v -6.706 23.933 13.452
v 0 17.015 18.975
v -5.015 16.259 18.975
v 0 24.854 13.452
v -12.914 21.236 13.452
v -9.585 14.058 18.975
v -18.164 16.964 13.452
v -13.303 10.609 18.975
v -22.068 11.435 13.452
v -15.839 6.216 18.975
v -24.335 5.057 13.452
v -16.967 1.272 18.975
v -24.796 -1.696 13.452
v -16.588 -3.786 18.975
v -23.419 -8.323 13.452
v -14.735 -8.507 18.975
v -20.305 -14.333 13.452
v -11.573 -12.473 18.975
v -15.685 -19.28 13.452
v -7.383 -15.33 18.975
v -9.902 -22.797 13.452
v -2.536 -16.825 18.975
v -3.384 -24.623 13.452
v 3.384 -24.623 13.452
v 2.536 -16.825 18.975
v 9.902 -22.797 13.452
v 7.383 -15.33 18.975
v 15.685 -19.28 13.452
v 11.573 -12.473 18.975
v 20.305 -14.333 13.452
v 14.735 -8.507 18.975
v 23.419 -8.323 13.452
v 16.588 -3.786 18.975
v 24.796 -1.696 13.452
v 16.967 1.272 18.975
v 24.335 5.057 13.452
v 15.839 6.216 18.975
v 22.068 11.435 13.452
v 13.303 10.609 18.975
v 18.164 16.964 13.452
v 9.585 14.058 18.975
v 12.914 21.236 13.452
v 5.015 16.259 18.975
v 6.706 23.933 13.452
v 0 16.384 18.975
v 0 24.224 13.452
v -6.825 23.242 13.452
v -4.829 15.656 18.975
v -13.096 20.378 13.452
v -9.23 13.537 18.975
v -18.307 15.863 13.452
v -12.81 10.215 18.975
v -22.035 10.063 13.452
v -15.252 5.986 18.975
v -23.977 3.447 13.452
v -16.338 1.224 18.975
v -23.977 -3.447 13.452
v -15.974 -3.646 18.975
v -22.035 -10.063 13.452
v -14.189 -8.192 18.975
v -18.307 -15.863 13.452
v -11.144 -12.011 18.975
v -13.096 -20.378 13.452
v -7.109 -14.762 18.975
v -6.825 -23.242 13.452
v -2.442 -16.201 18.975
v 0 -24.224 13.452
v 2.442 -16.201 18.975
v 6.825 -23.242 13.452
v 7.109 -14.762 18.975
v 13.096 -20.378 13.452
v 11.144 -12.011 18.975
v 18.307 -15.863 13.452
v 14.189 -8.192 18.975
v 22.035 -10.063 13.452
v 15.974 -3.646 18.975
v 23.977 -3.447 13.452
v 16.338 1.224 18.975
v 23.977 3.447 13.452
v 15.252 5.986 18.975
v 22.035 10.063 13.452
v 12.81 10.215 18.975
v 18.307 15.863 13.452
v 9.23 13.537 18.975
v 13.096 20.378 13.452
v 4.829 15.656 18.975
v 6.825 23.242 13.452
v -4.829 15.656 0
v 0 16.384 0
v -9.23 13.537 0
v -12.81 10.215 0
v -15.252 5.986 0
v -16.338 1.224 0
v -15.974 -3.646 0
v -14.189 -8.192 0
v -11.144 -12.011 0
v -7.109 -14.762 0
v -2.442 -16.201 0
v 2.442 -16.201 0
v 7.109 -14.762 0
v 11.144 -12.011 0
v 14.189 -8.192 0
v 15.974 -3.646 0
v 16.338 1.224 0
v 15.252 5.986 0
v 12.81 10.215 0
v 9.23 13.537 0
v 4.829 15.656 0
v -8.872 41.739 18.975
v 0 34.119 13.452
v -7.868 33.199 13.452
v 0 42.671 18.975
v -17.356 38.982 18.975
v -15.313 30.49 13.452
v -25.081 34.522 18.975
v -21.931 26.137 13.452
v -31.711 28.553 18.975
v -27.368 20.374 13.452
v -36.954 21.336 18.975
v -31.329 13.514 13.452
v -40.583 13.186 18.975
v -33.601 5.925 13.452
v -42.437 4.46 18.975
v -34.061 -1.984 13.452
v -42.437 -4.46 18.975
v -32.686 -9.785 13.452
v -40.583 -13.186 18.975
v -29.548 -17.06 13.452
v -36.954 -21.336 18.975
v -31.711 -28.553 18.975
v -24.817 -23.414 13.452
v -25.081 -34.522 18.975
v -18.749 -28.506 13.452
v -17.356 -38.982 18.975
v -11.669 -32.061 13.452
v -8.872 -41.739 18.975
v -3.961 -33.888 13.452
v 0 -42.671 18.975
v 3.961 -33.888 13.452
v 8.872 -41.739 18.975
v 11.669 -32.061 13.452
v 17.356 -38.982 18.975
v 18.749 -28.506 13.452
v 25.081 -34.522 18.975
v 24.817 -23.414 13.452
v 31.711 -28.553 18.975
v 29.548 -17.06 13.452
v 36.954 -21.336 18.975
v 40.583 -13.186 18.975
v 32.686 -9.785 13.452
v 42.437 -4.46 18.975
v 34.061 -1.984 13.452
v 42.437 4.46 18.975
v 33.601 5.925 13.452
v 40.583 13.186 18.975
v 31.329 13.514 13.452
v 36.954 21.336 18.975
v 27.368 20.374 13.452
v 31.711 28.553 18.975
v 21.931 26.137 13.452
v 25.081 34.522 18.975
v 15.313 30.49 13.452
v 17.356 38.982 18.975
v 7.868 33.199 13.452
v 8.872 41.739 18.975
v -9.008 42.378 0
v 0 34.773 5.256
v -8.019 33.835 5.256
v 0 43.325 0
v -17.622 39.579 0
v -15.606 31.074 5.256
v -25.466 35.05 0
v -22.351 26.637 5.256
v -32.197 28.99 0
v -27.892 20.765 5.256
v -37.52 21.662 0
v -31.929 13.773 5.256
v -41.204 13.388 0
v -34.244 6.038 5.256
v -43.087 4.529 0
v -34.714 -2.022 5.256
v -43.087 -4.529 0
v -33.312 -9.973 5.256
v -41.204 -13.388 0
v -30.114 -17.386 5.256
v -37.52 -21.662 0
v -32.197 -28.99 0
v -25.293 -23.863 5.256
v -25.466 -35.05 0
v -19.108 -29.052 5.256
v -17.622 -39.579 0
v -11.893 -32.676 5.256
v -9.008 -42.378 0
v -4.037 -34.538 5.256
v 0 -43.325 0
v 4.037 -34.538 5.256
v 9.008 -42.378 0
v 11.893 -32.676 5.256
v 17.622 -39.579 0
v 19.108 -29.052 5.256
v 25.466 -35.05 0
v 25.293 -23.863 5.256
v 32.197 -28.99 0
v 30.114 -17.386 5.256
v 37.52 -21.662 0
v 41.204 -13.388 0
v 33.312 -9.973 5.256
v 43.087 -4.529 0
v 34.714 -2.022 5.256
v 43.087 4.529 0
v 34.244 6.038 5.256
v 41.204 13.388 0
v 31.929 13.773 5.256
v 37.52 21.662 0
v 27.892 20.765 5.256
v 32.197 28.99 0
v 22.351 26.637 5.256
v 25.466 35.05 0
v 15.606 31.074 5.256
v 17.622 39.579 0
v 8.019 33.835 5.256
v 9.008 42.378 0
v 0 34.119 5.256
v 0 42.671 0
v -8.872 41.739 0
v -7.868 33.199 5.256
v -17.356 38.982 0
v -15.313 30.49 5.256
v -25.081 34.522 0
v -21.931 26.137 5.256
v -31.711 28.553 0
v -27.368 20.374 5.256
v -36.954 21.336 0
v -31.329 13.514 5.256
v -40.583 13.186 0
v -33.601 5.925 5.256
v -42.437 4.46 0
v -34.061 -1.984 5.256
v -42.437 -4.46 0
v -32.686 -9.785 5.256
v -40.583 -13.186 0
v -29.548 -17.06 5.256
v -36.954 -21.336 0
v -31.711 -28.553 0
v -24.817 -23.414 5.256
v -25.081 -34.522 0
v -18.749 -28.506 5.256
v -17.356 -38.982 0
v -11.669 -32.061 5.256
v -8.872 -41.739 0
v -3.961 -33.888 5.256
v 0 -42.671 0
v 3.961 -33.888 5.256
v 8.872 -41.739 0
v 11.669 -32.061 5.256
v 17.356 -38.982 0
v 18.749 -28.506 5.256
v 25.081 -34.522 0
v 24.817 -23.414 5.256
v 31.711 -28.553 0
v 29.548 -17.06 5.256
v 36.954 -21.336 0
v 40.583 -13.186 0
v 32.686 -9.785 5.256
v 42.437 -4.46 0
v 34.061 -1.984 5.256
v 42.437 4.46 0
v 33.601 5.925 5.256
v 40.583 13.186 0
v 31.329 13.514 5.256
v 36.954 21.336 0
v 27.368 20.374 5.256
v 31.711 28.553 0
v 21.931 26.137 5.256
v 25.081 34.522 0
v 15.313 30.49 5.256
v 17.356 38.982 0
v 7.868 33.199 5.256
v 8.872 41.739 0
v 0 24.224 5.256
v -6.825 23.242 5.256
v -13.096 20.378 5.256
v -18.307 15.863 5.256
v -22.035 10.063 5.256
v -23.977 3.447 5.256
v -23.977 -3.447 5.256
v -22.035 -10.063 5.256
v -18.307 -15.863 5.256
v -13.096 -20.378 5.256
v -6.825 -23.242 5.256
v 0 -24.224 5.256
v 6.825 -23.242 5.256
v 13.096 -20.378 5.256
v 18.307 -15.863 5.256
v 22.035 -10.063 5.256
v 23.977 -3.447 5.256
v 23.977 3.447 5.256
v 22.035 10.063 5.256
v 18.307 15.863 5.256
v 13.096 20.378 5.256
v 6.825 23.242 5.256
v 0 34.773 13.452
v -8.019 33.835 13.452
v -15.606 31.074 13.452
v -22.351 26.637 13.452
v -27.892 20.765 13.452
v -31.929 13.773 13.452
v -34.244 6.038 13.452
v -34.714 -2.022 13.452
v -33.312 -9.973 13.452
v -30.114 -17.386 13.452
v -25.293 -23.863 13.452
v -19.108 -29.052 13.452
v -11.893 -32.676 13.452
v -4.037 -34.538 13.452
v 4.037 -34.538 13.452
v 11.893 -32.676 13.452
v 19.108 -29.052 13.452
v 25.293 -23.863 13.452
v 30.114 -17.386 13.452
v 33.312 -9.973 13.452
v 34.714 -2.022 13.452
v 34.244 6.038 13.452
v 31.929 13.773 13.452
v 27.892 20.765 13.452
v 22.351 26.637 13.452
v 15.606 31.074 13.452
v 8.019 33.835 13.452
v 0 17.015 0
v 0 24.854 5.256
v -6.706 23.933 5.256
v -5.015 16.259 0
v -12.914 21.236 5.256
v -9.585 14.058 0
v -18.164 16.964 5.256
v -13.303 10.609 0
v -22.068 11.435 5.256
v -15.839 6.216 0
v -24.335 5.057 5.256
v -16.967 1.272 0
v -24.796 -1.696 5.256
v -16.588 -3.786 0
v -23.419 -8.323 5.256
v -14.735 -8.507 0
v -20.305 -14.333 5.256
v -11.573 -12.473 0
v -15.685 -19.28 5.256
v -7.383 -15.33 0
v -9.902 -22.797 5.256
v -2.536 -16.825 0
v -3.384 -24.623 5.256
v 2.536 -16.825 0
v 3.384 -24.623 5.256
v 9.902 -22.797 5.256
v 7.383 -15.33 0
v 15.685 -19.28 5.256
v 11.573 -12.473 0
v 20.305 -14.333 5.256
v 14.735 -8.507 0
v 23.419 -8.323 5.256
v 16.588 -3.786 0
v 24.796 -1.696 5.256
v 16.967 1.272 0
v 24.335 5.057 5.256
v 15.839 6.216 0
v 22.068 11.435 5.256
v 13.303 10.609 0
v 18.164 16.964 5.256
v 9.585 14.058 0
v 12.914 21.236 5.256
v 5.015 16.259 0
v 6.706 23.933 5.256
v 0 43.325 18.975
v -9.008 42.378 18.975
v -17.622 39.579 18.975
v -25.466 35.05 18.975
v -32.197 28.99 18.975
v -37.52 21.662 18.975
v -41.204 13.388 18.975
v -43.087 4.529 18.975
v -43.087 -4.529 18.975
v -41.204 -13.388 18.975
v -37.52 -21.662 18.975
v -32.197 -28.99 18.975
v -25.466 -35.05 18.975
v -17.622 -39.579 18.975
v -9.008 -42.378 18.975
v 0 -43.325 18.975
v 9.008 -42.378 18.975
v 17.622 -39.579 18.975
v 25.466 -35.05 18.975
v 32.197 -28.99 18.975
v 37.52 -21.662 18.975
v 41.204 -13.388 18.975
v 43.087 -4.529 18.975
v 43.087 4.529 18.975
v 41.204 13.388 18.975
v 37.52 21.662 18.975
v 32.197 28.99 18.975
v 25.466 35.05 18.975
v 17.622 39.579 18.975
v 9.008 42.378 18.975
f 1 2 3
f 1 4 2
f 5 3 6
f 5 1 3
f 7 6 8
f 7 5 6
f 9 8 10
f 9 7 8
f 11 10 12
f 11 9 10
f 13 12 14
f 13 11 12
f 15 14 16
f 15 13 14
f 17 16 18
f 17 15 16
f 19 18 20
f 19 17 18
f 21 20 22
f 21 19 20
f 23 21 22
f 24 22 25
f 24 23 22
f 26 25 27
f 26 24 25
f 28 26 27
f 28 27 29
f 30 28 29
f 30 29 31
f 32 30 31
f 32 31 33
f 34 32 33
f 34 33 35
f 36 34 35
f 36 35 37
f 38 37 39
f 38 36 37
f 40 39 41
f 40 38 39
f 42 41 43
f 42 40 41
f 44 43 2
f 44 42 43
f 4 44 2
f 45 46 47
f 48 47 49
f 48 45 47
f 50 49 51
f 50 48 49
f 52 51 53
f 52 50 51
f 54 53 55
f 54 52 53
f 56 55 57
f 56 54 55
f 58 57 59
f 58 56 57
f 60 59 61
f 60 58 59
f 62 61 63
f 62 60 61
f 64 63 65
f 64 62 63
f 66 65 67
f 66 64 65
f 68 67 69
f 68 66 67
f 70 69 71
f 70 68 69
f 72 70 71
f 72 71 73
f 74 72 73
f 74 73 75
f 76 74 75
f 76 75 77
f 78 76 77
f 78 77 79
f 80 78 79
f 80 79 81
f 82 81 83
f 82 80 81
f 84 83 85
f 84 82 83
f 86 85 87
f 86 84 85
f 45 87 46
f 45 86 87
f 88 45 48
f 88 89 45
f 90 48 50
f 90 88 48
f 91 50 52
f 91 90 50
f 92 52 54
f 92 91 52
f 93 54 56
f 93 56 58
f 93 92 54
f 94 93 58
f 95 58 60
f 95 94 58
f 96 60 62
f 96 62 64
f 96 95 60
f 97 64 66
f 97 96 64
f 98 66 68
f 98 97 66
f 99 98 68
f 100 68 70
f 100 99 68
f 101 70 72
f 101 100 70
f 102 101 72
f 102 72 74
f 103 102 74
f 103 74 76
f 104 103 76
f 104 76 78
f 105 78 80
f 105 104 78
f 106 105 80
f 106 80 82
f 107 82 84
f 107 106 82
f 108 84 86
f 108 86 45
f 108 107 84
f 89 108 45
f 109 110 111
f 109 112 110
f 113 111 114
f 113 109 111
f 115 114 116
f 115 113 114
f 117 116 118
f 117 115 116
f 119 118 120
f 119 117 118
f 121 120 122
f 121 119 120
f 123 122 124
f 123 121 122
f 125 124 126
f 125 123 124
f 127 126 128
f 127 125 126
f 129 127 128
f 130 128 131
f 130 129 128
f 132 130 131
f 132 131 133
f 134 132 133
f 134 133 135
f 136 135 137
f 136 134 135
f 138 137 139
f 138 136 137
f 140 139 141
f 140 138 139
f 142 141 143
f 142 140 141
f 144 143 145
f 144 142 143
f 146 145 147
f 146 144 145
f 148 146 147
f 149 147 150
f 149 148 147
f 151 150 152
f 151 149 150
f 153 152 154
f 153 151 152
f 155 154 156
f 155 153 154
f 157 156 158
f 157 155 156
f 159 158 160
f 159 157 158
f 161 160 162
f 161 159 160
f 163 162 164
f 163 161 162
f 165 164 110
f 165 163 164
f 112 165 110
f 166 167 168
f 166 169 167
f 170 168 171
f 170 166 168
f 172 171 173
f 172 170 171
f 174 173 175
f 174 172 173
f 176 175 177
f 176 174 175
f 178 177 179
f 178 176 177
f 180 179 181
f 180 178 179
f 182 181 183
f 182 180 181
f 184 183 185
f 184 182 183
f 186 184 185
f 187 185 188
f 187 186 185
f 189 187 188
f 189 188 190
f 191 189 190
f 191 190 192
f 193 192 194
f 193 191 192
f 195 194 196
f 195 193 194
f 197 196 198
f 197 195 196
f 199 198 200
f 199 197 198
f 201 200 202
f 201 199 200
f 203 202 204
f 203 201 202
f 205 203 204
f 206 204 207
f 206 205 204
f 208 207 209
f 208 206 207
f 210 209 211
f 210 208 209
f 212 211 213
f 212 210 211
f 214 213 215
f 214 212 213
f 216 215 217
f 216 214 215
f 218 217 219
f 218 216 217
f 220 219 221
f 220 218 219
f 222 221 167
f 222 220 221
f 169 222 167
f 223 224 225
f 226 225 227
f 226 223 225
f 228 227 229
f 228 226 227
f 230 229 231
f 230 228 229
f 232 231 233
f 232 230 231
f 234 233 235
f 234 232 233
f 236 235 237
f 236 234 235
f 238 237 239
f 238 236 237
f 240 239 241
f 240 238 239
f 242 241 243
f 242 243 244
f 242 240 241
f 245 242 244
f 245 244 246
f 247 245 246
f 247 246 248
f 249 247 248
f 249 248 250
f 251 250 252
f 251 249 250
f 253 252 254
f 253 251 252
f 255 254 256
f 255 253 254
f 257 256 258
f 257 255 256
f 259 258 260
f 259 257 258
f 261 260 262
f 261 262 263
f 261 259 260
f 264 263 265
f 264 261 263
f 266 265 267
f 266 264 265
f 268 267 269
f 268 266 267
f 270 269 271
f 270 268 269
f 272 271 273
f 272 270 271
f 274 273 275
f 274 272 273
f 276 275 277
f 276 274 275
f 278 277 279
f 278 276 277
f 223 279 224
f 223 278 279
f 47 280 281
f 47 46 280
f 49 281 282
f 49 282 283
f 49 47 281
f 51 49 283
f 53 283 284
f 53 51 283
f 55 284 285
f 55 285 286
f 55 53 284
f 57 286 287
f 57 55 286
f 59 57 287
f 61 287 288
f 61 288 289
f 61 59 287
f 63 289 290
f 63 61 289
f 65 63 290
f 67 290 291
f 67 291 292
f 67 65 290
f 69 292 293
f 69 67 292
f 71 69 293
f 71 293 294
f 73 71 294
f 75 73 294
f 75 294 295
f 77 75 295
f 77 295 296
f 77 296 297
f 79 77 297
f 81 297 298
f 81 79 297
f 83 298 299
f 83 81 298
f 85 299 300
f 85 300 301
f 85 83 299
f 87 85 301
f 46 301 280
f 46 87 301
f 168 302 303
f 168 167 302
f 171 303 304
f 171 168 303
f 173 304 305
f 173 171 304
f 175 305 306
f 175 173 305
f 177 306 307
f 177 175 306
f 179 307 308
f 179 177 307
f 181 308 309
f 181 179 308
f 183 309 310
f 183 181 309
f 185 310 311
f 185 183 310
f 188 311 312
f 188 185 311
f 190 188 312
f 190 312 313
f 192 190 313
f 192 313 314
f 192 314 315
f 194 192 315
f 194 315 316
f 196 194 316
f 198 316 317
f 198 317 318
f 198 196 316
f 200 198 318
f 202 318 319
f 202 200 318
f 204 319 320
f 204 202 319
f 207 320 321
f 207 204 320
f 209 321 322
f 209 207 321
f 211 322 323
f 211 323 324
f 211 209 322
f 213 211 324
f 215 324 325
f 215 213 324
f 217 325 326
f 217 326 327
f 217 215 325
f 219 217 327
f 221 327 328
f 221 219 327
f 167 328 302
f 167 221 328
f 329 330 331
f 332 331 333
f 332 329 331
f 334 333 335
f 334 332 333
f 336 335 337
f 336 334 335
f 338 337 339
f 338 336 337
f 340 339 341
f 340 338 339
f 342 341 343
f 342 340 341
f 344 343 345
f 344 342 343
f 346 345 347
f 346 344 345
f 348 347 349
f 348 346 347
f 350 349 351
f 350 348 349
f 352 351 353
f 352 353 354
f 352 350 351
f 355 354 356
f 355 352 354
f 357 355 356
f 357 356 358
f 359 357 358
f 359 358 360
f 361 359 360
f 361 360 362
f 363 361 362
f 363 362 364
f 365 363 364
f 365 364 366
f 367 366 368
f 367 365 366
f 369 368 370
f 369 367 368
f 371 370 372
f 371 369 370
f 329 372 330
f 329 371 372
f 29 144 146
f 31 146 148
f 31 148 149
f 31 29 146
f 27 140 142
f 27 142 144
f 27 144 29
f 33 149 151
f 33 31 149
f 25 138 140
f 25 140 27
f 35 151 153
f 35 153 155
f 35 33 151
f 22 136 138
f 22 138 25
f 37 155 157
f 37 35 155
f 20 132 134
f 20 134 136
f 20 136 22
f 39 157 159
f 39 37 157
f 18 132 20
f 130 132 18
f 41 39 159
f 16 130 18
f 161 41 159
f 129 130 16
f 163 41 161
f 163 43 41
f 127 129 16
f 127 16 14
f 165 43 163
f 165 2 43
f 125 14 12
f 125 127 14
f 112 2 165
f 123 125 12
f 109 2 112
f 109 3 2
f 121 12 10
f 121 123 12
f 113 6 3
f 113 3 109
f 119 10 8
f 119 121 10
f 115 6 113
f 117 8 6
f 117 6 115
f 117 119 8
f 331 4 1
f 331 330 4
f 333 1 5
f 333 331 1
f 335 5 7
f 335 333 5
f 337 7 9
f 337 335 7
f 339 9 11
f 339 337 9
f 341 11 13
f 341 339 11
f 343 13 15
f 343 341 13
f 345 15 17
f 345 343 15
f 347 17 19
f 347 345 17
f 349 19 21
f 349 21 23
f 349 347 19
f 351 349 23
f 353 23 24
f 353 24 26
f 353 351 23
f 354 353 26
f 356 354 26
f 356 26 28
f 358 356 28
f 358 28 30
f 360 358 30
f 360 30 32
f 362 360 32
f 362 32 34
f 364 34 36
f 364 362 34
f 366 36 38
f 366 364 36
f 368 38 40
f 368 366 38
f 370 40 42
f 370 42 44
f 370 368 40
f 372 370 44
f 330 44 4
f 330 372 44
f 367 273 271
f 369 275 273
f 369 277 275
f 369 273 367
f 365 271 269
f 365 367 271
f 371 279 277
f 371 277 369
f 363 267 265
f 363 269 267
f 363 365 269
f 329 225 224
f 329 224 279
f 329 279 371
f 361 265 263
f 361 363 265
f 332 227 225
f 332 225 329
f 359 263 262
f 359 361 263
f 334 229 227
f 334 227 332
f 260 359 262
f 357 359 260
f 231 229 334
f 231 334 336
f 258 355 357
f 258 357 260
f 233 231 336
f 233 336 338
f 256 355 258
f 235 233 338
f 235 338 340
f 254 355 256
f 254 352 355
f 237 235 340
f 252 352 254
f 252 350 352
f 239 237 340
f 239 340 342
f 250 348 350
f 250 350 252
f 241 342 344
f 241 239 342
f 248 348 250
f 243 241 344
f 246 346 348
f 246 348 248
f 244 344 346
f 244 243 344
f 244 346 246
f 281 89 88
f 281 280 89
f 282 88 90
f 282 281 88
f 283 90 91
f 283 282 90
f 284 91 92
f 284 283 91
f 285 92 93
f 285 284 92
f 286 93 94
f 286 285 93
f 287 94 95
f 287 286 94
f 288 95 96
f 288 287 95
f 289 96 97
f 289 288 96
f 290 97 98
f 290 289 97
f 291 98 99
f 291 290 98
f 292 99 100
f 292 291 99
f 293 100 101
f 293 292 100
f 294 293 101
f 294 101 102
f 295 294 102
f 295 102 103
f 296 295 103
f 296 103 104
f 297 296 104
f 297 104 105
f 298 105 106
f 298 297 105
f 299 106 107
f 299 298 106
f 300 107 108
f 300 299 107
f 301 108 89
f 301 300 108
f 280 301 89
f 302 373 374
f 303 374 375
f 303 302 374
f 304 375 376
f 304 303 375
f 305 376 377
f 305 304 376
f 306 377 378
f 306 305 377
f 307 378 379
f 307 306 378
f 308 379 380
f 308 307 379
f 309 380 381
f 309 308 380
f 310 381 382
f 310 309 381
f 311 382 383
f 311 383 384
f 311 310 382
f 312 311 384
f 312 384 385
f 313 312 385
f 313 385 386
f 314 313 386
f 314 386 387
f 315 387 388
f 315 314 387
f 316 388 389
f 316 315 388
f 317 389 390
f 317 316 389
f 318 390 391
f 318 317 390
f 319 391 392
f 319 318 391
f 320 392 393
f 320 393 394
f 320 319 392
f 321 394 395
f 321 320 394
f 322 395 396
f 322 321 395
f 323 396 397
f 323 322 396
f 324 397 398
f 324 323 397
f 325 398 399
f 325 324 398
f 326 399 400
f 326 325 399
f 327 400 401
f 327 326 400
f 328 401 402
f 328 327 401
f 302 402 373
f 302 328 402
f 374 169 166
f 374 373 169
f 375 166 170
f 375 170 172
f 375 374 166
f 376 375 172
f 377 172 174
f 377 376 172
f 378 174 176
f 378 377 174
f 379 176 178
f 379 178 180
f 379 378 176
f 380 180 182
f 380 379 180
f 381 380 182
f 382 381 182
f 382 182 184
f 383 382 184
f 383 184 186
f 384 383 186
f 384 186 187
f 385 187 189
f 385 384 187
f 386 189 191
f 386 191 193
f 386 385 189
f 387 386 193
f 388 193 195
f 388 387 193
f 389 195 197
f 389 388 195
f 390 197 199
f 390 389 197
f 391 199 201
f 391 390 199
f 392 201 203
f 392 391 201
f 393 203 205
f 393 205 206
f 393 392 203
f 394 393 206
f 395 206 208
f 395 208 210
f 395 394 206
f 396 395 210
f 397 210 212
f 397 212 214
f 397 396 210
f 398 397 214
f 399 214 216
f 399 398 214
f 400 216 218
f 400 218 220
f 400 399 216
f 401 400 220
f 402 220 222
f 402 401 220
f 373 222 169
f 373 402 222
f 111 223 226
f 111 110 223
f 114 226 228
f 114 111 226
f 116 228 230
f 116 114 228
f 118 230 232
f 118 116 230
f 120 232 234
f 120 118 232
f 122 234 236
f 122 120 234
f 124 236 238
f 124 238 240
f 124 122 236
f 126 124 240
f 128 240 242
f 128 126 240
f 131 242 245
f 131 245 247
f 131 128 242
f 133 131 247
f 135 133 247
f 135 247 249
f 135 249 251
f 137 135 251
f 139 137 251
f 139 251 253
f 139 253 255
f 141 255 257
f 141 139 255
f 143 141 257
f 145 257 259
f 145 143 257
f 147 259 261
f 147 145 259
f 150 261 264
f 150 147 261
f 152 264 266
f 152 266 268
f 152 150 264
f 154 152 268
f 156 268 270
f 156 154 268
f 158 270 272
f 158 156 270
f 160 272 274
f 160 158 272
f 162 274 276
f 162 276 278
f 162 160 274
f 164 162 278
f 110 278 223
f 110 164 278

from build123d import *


with BuildPart() as f1:
    # F0 (on Right) → F1 (revolve)
    with BuildSketch(Plane.YZ):
        Polygon((24.854356, 5.255939), (17.01499, 0), (42.671099, 0), (34.119062, 5.255939), (34.119062, 13.45164), (42.671099, 18.974831), (17.01499, 18.974831), (24.854356, 13.45164), align=None)
        Polygon((43.324787, 0), (43.324787, 18.974831), (34.77275, 13.45164), (34.77275, 5.255939), align=None)
        Polygon((24.223676, 13.45164), (16.384309, 18.974831), (16.384309, 0), (24.223676, 5.255939), align=None)
    revolve(axis=Axis((0, 0, 5.286295), (0, 0, 1)))


solid = f1.part
